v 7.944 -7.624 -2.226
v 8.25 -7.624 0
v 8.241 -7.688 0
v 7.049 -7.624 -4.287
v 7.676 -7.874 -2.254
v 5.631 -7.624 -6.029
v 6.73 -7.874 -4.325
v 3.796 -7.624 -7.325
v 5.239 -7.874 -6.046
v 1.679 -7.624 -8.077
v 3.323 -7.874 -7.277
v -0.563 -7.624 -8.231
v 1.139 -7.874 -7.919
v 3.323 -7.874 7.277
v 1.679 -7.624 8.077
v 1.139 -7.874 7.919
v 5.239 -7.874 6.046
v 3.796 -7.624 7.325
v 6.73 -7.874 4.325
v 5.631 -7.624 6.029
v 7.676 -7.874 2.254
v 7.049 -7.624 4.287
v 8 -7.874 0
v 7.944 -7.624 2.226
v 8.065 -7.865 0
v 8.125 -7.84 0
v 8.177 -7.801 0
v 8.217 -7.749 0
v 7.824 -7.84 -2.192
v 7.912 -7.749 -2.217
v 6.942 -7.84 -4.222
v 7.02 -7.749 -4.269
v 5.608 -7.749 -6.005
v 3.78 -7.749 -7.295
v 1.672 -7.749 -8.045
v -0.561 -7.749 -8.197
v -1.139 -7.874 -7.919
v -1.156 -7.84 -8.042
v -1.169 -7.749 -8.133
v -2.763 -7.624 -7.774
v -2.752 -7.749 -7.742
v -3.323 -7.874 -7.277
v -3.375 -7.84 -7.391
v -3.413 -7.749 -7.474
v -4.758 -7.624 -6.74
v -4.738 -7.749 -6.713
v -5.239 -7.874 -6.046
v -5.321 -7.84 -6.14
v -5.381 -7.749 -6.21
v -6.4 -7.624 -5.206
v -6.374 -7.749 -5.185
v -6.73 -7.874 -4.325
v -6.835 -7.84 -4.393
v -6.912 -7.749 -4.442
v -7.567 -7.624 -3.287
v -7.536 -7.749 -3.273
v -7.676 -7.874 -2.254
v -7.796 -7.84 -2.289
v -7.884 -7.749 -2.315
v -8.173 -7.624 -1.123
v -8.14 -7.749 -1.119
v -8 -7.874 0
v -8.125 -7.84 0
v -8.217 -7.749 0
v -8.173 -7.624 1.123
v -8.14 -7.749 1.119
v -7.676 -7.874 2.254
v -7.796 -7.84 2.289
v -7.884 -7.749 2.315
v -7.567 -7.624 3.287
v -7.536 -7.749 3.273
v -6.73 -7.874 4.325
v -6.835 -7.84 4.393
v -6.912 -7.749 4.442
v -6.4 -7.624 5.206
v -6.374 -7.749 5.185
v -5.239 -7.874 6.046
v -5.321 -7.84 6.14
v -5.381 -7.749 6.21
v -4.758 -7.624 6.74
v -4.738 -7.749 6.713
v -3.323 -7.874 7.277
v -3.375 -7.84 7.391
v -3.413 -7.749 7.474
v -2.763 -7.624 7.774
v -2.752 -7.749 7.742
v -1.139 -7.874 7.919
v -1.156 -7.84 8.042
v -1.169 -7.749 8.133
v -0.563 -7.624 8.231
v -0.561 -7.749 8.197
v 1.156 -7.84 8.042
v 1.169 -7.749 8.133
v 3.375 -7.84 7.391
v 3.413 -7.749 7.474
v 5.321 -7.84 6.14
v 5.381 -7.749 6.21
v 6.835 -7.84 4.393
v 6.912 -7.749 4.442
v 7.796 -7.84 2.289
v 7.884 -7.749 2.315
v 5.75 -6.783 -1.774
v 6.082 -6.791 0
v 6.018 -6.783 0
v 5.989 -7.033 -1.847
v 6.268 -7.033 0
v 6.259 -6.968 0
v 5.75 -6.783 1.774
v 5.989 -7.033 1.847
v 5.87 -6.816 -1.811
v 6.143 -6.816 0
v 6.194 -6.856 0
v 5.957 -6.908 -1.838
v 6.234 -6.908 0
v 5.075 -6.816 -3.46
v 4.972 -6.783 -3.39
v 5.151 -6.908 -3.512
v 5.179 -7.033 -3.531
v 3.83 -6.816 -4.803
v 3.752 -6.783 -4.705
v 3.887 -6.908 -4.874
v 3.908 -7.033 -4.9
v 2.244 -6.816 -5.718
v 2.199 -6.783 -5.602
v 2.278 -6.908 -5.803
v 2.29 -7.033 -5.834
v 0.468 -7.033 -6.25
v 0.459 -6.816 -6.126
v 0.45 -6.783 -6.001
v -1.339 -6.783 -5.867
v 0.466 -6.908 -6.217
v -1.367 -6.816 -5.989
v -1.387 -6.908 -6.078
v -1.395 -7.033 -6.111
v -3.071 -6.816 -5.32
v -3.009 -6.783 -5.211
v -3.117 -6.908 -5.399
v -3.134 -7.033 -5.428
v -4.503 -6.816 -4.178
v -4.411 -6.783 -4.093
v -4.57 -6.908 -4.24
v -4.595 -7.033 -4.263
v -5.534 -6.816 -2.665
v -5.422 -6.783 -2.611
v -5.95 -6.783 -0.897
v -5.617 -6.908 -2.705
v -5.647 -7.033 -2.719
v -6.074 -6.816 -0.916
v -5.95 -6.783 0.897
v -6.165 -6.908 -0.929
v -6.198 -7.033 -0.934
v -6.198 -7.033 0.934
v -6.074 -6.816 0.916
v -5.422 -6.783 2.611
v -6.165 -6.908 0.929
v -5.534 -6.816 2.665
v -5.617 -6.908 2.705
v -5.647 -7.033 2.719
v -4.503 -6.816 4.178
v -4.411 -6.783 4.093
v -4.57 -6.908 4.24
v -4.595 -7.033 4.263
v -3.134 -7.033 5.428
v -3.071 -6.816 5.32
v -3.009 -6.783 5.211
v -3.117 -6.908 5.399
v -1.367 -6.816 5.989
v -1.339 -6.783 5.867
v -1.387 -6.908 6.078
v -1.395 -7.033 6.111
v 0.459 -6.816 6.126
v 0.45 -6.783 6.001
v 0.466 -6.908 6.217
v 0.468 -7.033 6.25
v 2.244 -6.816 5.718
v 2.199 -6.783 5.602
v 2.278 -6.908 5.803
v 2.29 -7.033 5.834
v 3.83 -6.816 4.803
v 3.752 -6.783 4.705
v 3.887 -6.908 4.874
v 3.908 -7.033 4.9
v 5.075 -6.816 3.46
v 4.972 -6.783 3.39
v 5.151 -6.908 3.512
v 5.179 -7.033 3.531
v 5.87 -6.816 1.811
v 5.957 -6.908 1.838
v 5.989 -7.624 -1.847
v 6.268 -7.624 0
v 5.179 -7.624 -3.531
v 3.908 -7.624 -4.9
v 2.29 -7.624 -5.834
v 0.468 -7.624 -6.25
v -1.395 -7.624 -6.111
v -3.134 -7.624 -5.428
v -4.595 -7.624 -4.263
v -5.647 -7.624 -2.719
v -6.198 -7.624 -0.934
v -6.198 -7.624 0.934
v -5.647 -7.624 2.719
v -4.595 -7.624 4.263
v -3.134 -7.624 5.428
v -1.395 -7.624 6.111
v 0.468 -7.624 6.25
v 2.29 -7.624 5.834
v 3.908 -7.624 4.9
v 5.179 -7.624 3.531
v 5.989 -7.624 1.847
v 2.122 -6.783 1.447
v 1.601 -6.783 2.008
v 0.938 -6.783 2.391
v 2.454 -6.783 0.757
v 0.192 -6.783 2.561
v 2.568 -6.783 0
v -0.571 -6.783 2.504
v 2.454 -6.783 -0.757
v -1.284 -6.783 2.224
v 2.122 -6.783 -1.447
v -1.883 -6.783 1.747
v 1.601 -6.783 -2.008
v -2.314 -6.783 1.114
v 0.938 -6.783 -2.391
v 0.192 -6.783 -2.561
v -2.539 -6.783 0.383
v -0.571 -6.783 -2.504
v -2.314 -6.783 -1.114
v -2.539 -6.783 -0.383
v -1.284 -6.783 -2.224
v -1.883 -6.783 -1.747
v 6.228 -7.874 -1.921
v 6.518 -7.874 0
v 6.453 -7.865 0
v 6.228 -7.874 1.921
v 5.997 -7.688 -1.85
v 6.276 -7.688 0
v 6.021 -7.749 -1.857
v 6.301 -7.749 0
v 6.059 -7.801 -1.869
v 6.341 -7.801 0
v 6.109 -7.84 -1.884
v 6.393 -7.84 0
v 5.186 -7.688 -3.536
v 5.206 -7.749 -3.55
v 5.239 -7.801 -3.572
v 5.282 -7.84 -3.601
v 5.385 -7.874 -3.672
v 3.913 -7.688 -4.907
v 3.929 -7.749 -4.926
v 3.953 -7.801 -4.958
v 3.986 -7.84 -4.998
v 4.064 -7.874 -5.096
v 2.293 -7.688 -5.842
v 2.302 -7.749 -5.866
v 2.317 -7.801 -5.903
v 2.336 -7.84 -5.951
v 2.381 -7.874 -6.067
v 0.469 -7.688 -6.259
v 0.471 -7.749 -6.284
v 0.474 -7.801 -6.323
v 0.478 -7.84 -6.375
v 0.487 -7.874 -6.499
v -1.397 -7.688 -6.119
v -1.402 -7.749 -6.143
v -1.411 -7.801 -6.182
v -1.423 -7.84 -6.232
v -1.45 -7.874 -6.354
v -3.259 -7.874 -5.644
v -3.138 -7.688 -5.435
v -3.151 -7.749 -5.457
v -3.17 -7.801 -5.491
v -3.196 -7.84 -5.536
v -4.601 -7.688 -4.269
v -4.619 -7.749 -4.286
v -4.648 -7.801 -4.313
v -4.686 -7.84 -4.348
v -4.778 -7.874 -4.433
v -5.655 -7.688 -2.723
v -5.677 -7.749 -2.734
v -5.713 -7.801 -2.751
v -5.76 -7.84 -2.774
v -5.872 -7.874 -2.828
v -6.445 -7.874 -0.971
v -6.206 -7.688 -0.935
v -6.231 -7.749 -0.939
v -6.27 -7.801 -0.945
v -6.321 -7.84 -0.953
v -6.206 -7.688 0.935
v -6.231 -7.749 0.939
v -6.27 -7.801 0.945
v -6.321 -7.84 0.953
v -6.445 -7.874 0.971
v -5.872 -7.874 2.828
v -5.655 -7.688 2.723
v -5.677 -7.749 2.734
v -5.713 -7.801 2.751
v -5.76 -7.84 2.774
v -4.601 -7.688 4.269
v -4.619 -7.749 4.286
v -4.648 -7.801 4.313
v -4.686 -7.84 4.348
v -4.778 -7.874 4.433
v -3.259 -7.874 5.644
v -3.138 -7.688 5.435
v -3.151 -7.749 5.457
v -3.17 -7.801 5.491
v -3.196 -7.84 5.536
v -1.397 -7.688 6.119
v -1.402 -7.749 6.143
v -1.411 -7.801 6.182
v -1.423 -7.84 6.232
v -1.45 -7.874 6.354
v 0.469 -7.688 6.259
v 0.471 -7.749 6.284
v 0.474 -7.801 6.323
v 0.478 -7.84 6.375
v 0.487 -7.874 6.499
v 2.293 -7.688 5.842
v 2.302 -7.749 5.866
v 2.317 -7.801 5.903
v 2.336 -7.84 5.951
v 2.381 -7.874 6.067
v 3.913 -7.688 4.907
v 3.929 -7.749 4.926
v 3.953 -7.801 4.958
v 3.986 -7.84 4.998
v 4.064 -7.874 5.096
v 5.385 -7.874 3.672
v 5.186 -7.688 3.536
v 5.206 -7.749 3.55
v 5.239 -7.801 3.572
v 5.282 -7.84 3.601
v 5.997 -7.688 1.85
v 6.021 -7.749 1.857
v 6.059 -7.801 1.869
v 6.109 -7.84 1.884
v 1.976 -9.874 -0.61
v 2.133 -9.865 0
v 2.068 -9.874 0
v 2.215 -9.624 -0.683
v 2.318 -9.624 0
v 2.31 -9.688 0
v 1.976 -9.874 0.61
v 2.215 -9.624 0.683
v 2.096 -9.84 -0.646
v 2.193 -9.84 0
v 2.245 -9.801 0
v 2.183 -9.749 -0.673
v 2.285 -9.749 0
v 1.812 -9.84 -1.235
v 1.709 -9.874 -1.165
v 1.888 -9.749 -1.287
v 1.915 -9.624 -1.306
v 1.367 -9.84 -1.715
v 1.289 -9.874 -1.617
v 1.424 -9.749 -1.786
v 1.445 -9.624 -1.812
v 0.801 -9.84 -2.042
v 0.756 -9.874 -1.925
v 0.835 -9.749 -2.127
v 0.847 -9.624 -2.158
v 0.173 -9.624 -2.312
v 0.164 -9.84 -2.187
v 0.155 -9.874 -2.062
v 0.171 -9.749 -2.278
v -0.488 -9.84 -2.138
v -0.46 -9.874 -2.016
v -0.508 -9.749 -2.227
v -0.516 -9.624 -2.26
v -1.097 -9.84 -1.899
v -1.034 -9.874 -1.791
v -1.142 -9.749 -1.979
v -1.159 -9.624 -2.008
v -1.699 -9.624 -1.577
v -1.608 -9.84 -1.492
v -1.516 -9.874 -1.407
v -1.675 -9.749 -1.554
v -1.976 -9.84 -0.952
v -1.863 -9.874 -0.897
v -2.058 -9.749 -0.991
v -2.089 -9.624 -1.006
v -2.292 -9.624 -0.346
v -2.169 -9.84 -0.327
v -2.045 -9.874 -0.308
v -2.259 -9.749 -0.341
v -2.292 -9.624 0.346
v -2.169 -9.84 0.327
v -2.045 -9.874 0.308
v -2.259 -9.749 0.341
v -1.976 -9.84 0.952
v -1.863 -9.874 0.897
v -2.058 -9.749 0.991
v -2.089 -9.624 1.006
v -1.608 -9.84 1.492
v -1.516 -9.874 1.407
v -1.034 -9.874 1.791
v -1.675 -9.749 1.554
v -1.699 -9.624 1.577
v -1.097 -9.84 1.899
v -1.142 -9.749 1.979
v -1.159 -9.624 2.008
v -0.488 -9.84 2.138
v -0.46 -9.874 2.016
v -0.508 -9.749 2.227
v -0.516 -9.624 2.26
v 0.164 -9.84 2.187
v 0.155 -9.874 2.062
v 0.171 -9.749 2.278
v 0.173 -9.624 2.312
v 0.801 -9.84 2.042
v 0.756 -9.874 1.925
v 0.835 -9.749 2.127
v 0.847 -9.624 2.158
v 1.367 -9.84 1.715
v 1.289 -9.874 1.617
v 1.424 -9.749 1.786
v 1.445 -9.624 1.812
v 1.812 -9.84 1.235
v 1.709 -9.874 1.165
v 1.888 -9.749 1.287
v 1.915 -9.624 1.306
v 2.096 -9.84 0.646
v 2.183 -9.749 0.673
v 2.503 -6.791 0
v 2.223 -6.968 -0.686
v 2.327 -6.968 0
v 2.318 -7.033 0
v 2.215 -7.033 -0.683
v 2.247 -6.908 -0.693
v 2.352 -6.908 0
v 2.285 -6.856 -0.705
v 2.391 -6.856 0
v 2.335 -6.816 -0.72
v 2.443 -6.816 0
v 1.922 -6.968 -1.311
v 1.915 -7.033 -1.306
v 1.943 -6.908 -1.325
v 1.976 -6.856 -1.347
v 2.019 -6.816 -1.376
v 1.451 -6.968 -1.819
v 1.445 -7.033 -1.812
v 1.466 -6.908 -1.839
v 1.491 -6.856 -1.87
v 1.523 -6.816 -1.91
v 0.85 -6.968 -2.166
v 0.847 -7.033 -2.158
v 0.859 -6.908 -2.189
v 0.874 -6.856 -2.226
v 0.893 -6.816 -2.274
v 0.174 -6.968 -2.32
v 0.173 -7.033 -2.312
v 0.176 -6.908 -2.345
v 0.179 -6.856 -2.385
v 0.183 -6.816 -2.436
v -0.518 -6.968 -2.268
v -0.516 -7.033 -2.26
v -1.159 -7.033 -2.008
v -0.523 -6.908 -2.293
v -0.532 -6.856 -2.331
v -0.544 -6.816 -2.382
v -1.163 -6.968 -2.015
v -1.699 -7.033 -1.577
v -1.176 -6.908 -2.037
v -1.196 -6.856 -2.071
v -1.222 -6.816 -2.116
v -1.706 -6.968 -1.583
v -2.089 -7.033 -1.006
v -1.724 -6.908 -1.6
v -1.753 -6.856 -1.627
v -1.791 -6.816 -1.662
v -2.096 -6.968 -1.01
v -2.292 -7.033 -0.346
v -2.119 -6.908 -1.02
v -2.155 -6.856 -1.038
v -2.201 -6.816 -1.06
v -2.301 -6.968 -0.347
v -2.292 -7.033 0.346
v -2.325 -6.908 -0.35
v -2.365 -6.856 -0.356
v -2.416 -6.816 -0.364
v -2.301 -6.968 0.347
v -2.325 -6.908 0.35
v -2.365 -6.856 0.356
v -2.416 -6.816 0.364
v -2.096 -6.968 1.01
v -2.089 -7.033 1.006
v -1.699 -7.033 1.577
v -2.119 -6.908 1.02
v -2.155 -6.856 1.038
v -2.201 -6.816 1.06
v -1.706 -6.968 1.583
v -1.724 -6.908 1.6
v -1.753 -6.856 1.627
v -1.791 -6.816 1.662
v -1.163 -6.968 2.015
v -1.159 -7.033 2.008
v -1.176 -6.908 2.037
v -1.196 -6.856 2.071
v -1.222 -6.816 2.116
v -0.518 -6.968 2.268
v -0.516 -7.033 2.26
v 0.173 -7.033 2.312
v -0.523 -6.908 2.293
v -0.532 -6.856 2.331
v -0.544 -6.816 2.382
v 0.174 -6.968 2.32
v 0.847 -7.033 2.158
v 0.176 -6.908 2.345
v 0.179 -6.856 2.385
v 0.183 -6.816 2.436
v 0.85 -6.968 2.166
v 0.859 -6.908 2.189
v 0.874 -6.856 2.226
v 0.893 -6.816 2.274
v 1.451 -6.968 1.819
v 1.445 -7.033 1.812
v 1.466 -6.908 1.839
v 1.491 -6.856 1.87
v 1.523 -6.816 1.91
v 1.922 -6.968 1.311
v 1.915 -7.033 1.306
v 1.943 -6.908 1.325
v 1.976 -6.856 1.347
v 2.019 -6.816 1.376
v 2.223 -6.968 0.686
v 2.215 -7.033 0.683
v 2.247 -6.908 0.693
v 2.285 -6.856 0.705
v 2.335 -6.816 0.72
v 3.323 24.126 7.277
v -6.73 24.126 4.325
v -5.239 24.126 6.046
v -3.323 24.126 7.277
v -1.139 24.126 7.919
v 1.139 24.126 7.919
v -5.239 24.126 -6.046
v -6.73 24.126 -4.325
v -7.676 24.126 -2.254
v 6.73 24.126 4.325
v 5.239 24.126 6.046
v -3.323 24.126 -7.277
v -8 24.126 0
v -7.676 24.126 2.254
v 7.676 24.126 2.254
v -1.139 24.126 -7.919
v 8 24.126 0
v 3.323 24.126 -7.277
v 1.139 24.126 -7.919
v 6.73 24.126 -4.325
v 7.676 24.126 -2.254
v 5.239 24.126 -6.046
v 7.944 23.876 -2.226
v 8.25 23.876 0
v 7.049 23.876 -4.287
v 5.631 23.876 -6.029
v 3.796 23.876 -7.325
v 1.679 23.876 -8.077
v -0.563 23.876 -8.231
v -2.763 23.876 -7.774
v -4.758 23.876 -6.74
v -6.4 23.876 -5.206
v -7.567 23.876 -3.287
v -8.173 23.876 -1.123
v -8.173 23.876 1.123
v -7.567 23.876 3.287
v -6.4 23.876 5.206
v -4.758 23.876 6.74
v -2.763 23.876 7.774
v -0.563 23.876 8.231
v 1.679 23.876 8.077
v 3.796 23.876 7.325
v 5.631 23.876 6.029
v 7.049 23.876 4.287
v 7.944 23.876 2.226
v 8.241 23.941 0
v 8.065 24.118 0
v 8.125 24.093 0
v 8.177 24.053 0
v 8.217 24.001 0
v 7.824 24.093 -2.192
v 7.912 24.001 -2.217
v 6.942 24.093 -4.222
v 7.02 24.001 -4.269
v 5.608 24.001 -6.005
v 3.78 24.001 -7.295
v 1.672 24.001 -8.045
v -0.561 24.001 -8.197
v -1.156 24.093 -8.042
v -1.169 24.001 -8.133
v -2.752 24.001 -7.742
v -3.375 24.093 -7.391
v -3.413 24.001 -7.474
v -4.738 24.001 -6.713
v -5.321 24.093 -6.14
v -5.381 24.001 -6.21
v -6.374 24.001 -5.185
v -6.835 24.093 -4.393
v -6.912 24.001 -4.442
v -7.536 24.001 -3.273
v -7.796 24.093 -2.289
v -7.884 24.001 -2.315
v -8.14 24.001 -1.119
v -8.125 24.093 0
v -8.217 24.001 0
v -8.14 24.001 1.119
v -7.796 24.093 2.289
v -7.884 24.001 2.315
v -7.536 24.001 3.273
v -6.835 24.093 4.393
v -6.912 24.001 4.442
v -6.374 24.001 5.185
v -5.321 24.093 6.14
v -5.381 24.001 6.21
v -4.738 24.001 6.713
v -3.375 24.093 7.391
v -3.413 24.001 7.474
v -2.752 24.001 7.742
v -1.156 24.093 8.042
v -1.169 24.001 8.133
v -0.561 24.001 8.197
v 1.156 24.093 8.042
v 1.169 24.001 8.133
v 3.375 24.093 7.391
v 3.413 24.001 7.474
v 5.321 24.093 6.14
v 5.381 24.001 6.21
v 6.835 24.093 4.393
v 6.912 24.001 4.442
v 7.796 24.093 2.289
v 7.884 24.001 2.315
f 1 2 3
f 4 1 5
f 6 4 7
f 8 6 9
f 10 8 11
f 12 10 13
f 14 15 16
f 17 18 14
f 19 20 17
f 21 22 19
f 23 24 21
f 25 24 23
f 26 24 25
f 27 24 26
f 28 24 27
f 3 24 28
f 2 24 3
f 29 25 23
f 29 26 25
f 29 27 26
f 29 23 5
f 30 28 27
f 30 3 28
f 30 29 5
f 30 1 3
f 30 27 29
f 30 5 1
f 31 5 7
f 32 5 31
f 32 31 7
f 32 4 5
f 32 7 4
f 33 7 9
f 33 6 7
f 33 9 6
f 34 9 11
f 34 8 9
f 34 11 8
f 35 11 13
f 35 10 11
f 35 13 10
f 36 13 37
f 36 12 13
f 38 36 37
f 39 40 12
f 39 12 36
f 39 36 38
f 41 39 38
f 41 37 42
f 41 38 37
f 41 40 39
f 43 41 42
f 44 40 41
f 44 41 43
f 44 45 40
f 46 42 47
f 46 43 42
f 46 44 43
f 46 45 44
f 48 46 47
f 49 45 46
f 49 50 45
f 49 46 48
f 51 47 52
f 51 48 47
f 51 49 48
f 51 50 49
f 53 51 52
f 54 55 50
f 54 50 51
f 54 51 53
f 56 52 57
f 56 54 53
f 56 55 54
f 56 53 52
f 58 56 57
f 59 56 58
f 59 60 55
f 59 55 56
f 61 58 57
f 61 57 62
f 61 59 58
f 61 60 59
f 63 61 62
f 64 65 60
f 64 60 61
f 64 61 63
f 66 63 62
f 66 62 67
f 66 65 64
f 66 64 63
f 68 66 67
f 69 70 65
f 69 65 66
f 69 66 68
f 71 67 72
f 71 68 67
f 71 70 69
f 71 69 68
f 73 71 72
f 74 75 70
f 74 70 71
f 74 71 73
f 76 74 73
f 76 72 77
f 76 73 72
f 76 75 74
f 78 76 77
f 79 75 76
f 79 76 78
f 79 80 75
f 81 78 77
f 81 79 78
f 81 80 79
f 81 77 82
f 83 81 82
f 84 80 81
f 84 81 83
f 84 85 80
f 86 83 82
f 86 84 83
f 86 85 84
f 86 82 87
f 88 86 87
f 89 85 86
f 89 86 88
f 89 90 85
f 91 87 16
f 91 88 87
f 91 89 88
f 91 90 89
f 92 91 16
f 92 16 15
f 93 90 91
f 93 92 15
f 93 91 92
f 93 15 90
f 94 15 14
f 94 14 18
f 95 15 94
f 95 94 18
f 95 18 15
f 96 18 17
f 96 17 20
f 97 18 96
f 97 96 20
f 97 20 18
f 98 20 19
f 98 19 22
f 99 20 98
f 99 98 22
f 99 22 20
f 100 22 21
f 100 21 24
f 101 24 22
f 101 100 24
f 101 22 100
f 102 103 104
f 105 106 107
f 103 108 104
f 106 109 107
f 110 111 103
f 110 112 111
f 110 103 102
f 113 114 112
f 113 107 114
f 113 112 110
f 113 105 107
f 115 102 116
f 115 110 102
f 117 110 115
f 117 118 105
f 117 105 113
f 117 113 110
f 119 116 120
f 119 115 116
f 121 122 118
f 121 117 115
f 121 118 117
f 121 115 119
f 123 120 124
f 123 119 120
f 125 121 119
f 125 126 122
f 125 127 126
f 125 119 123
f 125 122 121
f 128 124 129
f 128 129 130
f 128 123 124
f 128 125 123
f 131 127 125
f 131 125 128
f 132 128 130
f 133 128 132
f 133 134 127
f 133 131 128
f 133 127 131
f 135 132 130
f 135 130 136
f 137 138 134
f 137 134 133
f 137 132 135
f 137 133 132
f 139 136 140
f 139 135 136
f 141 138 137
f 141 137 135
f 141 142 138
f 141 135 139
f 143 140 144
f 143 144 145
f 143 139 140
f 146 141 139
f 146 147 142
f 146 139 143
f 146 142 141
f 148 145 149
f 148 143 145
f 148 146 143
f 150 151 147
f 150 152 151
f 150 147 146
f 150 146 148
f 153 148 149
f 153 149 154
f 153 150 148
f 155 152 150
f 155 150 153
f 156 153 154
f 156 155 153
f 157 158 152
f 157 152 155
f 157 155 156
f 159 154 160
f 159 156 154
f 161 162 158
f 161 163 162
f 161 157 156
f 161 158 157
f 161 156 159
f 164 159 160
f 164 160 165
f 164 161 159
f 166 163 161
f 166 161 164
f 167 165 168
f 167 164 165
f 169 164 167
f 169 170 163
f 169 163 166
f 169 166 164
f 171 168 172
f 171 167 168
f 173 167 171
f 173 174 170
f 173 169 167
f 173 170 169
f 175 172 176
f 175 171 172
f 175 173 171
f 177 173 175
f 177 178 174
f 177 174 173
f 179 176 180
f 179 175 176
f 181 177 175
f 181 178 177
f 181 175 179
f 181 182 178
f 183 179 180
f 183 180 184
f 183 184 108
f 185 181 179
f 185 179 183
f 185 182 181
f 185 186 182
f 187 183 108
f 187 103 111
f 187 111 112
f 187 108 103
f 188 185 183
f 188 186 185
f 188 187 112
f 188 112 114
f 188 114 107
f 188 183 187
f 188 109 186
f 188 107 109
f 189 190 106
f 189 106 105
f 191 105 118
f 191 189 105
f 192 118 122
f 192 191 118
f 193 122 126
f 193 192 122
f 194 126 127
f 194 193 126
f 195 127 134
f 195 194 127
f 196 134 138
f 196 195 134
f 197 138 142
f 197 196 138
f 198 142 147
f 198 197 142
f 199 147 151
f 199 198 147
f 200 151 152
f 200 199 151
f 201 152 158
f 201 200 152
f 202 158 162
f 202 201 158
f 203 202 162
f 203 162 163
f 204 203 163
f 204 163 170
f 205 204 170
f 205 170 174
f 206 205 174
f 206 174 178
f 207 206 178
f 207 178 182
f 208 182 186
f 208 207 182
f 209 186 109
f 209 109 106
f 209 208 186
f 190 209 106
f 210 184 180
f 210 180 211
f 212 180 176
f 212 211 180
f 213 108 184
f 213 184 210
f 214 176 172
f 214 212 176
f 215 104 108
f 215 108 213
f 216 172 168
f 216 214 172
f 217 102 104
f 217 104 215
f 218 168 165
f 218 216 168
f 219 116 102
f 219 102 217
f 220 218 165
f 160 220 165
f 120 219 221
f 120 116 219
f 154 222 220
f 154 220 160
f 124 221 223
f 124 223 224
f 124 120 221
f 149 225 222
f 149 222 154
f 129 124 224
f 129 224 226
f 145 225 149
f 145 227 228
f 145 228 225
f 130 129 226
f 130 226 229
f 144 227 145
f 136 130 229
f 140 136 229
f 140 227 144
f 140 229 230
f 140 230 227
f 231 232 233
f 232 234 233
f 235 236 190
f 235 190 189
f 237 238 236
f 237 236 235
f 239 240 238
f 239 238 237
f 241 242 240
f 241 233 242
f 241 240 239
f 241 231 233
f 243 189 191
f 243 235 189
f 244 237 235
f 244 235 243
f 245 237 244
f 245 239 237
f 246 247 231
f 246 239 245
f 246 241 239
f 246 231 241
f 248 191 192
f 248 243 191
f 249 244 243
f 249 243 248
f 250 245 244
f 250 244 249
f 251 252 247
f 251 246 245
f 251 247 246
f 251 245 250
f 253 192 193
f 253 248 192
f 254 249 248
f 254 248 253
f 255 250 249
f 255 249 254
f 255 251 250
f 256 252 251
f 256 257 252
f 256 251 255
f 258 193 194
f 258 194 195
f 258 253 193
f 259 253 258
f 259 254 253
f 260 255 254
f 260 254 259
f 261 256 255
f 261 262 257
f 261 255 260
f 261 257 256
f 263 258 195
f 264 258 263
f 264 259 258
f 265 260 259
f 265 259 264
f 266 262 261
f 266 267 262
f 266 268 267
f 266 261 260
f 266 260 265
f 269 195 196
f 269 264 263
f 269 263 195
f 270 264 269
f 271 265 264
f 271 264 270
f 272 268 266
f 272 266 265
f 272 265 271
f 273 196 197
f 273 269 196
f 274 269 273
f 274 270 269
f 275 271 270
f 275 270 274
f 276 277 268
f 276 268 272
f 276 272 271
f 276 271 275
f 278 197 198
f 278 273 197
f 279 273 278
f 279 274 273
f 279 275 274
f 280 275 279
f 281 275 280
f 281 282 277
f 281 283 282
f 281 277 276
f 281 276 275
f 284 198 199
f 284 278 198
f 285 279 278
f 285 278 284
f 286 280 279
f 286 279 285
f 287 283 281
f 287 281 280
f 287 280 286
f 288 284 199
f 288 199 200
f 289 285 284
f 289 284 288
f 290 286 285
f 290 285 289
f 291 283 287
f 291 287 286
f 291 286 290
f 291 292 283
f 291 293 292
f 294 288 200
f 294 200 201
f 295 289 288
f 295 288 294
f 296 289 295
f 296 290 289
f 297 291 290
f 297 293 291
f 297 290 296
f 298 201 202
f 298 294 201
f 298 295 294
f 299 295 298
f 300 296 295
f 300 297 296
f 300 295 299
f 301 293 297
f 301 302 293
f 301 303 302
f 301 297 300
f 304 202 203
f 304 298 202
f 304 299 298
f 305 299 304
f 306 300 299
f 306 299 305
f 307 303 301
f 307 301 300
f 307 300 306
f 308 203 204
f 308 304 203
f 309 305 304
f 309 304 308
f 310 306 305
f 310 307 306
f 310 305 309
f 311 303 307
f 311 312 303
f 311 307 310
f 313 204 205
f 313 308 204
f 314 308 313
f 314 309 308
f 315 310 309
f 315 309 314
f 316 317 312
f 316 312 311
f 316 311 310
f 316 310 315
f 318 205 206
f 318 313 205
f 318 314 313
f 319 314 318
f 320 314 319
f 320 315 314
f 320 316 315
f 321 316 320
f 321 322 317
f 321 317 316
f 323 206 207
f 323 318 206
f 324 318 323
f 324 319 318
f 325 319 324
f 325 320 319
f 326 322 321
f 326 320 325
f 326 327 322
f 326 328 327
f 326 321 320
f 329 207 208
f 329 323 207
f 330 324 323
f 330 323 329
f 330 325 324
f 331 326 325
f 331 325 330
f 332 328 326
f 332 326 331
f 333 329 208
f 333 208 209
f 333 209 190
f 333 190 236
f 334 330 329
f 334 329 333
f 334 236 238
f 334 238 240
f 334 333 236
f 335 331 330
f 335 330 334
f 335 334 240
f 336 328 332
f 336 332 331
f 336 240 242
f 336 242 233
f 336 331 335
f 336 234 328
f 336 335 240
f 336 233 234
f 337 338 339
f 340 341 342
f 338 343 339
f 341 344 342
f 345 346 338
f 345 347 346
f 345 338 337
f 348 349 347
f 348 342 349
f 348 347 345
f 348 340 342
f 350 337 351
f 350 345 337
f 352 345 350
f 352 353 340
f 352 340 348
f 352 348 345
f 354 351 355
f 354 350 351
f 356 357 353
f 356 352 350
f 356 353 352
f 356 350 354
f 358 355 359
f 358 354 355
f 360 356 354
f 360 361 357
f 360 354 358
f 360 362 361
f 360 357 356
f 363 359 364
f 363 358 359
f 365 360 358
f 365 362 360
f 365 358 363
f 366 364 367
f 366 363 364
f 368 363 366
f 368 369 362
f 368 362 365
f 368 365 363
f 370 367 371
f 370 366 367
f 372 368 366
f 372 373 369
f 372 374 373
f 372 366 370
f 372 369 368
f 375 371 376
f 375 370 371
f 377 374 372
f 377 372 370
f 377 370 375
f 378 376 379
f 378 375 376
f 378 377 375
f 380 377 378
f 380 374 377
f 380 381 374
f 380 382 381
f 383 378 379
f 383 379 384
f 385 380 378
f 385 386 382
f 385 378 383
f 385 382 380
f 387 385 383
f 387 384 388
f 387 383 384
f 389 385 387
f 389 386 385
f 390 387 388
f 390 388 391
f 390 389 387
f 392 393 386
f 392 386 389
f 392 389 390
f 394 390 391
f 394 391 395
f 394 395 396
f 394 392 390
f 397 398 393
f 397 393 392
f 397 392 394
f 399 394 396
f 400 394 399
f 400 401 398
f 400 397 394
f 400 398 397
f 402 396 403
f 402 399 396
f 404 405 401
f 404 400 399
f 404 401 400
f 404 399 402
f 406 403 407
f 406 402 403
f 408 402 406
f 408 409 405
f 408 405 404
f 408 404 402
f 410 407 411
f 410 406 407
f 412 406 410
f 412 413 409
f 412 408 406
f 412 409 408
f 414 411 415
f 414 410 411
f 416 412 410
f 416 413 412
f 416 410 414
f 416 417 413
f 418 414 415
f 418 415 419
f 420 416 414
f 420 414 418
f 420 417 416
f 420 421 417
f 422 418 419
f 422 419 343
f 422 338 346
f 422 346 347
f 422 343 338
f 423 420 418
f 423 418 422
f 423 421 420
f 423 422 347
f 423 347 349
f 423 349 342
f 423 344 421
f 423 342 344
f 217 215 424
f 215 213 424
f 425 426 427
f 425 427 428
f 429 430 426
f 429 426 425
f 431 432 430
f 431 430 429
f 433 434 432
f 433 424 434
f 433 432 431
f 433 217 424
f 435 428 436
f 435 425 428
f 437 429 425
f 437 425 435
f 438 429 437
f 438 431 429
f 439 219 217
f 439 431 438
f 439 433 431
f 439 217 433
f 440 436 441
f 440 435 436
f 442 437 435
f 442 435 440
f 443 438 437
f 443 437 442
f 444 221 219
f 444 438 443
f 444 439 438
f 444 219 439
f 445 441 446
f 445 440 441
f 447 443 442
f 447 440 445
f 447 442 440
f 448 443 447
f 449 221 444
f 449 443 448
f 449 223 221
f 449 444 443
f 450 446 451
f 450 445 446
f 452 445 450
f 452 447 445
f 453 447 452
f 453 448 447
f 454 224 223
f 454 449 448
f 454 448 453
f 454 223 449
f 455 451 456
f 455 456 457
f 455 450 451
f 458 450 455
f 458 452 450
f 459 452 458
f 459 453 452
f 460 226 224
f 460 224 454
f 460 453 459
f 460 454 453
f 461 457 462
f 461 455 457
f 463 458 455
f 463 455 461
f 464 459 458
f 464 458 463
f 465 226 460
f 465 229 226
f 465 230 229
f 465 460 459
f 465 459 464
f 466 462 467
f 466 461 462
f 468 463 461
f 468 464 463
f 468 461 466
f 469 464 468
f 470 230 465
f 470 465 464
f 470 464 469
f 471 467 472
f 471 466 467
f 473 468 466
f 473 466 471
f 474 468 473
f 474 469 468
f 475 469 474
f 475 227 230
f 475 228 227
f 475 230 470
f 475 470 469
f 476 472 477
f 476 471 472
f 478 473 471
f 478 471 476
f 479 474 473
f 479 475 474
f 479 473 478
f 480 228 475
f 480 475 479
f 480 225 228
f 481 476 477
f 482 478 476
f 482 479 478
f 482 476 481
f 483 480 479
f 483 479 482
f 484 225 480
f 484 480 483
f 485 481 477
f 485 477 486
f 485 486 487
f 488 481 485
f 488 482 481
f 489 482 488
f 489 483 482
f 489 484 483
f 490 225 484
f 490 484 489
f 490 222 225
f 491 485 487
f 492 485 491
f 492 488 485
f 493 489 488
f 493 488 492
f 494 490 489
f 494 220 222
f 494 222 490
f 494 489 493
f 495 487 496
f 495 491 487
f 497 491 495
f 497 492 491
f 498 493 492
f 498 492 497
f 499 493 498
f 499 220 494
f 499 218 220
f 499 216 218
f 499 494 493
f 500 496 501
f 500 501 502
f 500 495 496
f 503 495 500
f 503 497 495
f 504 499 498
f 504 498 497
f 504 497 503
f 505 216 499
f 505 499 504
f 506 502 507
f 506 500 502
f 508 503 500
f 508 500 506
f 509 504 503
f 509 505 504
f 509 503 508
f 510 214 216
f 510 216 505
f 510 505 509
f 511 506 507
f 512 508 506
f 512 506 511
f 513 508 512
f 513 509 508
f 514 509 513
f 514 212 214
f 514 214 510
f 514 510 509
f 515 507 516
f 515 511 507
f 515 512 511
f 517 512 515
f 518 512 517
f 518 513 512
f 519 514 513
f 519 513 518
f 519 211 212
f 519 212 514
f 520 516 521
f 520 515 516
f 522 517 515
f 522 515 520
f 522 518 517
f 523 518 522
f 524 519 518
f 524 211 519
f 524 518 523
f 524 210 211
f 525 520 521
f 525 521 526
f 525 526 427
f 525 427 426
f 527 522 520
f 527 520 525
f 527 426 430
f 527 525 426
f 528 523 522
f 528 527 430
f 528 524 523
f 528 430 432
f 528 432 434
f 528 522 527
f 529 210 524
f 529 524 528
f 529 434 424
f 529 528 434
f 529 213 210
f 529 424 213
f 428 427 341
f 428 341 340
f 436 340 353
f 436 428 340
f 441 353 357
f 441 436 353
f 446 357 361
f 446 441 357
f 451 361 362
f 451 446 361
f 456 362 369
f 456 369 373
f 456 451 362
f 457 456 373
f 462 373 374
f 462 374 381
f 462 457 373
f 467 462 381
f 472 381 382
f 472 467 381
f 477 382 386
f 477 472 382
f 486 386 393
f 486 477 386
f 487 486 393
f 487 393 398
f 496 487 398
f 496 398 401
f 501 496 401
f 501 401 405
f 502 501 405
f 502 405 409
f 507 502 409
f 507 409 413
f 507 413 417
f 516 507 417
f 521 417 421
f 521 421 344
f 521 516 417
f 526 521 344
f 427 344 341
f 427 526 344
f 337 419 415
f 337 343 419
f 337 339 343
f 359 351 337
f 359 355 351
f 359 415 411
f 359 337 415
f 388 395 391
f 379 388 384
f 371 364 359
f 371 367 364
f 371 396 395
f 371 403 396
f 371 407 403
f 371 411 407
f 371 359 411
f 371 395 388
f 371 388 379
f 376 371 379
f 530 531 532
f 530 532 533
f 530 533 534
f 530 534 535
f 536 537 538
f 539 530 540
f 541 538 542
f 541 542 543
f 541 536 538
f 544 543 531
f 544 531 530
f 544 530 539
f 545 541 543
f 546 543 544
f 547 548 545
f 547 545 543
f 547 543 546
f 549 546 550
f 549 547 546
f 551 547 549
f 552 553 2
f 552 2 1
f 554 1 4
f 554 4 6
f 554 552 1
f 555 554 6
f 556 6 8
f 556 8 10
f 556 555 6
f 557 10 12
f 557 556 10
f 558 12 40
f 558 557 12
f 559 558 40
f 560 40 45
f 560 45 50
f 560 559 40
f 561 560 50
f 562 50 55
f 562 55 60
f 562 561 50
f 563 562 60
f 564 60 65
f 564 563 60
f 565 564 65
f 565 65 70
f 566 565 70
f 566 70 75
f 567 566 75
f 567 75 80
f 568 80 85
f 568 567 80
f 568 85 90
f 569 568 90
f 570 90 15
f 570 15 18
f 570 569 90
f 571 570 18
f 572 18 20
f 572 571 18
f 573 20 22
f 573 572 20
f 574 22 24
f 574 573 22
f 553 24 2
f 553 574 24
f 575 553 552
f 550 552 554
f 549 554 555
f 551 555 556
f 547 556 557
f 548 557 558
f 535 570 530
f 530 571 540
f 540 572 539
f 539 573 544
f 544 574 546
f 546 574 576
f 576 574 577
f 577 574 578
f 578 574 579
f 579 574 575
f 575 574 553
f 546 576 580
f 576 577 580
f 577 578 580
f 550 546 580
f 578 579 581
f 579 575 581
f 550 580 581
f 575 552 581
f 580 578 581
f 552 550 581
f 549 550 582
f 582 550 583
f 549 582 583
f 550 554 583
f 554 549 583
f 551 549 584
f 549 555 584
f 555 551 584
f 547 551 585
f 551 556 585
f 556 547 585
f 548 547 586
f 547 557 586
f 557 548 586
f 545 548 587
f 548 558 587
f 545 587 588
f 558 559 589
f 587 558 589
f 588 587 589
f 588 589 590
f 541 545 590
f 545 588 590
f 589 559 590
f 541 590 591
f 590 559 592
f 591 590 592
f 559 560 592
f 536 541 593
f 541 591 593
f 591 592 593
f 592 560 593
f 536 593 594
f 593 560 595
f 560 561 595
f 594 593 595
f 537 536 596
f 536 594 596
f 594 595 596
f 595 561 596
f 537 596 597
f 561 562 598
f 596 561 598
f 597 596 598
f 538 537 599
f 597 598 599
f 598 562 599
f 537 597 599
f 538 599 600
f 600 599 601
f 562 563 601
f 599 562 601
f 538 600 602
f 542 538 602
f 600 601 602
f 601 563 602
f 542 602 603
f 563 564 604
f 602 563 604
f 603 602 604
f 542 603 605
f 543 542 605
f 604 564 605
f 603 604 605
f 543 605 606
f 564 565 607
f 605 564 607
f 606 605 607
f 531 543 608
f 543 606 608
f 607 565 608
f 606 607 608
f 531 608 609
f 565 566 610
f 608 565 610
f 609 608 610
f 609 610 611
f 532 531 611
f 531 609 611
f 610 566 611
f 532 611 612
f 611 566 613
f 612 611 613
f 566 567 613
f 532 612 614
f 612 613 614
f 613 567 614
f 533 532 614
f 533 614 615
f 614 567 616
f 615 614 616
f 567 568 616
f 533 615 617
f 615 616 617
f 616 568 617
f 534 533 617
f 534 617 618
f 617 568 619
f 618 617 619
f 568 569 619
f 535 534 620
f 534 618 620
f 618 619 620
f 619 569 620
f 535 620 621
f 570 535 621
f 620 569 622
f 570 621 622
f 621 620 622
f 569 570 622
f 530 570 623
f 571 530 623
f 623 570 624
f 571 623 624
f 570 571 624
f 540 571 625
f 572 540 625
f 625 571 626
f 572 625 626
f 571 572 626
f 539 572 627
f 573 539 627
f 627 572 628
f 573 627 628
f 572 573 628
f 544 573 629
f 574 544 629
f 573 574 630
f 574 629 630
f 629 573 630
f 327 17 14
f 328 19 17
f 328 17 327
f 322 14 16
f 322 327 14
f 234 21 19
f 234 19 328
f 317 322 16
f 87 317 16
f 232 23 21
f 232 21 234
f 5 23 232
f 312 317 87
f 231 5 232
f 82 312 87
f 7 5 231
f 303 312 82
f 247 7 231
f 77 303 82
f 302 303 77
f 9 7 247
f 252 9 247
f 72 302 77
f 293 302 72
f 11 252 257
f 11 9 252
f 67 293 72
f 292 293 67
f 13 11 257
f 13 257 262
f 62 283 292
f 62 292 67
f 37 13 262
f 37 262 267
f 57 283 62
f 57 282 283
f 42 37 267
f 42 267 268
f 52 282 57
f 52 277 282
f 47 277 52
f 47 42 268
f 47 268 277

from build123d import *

# Parameters (mm, degrees)
F2_R = 0.25


with BuildPart() as f1:
    # F0 (on Top) → F1 (revolve)
    with BuildSketch(Plane.XY):
        Polygon((8.25, 24.126262), (0, 24.126262), (0, -9.873738), (2.318181, -9.873738), (2.318181, -6.782828), (6.267677, -6.782828), (6.267677, -7.873738), (8.25, -7.873738), align=None)
    revolve(axis=Axis((0, 7.126262, 0), (0, 1, 0)))

    # F2
    f2_edges = [f1.edges().sort_by_distance(p)[0] for p in [
        (-8.25, 24.126262, 0),
        (-8.25, -7.873738, 0),
        (-6.267677, -7.873738, 0),
        (-6.267677, -6.782828, 0),
        (-2.318181, -6.782828, 0),
        (-2.318181, -9.873738, 0),
    ]]
    fillet(f2_edges, radius=F2_R)


solid = f1.part
